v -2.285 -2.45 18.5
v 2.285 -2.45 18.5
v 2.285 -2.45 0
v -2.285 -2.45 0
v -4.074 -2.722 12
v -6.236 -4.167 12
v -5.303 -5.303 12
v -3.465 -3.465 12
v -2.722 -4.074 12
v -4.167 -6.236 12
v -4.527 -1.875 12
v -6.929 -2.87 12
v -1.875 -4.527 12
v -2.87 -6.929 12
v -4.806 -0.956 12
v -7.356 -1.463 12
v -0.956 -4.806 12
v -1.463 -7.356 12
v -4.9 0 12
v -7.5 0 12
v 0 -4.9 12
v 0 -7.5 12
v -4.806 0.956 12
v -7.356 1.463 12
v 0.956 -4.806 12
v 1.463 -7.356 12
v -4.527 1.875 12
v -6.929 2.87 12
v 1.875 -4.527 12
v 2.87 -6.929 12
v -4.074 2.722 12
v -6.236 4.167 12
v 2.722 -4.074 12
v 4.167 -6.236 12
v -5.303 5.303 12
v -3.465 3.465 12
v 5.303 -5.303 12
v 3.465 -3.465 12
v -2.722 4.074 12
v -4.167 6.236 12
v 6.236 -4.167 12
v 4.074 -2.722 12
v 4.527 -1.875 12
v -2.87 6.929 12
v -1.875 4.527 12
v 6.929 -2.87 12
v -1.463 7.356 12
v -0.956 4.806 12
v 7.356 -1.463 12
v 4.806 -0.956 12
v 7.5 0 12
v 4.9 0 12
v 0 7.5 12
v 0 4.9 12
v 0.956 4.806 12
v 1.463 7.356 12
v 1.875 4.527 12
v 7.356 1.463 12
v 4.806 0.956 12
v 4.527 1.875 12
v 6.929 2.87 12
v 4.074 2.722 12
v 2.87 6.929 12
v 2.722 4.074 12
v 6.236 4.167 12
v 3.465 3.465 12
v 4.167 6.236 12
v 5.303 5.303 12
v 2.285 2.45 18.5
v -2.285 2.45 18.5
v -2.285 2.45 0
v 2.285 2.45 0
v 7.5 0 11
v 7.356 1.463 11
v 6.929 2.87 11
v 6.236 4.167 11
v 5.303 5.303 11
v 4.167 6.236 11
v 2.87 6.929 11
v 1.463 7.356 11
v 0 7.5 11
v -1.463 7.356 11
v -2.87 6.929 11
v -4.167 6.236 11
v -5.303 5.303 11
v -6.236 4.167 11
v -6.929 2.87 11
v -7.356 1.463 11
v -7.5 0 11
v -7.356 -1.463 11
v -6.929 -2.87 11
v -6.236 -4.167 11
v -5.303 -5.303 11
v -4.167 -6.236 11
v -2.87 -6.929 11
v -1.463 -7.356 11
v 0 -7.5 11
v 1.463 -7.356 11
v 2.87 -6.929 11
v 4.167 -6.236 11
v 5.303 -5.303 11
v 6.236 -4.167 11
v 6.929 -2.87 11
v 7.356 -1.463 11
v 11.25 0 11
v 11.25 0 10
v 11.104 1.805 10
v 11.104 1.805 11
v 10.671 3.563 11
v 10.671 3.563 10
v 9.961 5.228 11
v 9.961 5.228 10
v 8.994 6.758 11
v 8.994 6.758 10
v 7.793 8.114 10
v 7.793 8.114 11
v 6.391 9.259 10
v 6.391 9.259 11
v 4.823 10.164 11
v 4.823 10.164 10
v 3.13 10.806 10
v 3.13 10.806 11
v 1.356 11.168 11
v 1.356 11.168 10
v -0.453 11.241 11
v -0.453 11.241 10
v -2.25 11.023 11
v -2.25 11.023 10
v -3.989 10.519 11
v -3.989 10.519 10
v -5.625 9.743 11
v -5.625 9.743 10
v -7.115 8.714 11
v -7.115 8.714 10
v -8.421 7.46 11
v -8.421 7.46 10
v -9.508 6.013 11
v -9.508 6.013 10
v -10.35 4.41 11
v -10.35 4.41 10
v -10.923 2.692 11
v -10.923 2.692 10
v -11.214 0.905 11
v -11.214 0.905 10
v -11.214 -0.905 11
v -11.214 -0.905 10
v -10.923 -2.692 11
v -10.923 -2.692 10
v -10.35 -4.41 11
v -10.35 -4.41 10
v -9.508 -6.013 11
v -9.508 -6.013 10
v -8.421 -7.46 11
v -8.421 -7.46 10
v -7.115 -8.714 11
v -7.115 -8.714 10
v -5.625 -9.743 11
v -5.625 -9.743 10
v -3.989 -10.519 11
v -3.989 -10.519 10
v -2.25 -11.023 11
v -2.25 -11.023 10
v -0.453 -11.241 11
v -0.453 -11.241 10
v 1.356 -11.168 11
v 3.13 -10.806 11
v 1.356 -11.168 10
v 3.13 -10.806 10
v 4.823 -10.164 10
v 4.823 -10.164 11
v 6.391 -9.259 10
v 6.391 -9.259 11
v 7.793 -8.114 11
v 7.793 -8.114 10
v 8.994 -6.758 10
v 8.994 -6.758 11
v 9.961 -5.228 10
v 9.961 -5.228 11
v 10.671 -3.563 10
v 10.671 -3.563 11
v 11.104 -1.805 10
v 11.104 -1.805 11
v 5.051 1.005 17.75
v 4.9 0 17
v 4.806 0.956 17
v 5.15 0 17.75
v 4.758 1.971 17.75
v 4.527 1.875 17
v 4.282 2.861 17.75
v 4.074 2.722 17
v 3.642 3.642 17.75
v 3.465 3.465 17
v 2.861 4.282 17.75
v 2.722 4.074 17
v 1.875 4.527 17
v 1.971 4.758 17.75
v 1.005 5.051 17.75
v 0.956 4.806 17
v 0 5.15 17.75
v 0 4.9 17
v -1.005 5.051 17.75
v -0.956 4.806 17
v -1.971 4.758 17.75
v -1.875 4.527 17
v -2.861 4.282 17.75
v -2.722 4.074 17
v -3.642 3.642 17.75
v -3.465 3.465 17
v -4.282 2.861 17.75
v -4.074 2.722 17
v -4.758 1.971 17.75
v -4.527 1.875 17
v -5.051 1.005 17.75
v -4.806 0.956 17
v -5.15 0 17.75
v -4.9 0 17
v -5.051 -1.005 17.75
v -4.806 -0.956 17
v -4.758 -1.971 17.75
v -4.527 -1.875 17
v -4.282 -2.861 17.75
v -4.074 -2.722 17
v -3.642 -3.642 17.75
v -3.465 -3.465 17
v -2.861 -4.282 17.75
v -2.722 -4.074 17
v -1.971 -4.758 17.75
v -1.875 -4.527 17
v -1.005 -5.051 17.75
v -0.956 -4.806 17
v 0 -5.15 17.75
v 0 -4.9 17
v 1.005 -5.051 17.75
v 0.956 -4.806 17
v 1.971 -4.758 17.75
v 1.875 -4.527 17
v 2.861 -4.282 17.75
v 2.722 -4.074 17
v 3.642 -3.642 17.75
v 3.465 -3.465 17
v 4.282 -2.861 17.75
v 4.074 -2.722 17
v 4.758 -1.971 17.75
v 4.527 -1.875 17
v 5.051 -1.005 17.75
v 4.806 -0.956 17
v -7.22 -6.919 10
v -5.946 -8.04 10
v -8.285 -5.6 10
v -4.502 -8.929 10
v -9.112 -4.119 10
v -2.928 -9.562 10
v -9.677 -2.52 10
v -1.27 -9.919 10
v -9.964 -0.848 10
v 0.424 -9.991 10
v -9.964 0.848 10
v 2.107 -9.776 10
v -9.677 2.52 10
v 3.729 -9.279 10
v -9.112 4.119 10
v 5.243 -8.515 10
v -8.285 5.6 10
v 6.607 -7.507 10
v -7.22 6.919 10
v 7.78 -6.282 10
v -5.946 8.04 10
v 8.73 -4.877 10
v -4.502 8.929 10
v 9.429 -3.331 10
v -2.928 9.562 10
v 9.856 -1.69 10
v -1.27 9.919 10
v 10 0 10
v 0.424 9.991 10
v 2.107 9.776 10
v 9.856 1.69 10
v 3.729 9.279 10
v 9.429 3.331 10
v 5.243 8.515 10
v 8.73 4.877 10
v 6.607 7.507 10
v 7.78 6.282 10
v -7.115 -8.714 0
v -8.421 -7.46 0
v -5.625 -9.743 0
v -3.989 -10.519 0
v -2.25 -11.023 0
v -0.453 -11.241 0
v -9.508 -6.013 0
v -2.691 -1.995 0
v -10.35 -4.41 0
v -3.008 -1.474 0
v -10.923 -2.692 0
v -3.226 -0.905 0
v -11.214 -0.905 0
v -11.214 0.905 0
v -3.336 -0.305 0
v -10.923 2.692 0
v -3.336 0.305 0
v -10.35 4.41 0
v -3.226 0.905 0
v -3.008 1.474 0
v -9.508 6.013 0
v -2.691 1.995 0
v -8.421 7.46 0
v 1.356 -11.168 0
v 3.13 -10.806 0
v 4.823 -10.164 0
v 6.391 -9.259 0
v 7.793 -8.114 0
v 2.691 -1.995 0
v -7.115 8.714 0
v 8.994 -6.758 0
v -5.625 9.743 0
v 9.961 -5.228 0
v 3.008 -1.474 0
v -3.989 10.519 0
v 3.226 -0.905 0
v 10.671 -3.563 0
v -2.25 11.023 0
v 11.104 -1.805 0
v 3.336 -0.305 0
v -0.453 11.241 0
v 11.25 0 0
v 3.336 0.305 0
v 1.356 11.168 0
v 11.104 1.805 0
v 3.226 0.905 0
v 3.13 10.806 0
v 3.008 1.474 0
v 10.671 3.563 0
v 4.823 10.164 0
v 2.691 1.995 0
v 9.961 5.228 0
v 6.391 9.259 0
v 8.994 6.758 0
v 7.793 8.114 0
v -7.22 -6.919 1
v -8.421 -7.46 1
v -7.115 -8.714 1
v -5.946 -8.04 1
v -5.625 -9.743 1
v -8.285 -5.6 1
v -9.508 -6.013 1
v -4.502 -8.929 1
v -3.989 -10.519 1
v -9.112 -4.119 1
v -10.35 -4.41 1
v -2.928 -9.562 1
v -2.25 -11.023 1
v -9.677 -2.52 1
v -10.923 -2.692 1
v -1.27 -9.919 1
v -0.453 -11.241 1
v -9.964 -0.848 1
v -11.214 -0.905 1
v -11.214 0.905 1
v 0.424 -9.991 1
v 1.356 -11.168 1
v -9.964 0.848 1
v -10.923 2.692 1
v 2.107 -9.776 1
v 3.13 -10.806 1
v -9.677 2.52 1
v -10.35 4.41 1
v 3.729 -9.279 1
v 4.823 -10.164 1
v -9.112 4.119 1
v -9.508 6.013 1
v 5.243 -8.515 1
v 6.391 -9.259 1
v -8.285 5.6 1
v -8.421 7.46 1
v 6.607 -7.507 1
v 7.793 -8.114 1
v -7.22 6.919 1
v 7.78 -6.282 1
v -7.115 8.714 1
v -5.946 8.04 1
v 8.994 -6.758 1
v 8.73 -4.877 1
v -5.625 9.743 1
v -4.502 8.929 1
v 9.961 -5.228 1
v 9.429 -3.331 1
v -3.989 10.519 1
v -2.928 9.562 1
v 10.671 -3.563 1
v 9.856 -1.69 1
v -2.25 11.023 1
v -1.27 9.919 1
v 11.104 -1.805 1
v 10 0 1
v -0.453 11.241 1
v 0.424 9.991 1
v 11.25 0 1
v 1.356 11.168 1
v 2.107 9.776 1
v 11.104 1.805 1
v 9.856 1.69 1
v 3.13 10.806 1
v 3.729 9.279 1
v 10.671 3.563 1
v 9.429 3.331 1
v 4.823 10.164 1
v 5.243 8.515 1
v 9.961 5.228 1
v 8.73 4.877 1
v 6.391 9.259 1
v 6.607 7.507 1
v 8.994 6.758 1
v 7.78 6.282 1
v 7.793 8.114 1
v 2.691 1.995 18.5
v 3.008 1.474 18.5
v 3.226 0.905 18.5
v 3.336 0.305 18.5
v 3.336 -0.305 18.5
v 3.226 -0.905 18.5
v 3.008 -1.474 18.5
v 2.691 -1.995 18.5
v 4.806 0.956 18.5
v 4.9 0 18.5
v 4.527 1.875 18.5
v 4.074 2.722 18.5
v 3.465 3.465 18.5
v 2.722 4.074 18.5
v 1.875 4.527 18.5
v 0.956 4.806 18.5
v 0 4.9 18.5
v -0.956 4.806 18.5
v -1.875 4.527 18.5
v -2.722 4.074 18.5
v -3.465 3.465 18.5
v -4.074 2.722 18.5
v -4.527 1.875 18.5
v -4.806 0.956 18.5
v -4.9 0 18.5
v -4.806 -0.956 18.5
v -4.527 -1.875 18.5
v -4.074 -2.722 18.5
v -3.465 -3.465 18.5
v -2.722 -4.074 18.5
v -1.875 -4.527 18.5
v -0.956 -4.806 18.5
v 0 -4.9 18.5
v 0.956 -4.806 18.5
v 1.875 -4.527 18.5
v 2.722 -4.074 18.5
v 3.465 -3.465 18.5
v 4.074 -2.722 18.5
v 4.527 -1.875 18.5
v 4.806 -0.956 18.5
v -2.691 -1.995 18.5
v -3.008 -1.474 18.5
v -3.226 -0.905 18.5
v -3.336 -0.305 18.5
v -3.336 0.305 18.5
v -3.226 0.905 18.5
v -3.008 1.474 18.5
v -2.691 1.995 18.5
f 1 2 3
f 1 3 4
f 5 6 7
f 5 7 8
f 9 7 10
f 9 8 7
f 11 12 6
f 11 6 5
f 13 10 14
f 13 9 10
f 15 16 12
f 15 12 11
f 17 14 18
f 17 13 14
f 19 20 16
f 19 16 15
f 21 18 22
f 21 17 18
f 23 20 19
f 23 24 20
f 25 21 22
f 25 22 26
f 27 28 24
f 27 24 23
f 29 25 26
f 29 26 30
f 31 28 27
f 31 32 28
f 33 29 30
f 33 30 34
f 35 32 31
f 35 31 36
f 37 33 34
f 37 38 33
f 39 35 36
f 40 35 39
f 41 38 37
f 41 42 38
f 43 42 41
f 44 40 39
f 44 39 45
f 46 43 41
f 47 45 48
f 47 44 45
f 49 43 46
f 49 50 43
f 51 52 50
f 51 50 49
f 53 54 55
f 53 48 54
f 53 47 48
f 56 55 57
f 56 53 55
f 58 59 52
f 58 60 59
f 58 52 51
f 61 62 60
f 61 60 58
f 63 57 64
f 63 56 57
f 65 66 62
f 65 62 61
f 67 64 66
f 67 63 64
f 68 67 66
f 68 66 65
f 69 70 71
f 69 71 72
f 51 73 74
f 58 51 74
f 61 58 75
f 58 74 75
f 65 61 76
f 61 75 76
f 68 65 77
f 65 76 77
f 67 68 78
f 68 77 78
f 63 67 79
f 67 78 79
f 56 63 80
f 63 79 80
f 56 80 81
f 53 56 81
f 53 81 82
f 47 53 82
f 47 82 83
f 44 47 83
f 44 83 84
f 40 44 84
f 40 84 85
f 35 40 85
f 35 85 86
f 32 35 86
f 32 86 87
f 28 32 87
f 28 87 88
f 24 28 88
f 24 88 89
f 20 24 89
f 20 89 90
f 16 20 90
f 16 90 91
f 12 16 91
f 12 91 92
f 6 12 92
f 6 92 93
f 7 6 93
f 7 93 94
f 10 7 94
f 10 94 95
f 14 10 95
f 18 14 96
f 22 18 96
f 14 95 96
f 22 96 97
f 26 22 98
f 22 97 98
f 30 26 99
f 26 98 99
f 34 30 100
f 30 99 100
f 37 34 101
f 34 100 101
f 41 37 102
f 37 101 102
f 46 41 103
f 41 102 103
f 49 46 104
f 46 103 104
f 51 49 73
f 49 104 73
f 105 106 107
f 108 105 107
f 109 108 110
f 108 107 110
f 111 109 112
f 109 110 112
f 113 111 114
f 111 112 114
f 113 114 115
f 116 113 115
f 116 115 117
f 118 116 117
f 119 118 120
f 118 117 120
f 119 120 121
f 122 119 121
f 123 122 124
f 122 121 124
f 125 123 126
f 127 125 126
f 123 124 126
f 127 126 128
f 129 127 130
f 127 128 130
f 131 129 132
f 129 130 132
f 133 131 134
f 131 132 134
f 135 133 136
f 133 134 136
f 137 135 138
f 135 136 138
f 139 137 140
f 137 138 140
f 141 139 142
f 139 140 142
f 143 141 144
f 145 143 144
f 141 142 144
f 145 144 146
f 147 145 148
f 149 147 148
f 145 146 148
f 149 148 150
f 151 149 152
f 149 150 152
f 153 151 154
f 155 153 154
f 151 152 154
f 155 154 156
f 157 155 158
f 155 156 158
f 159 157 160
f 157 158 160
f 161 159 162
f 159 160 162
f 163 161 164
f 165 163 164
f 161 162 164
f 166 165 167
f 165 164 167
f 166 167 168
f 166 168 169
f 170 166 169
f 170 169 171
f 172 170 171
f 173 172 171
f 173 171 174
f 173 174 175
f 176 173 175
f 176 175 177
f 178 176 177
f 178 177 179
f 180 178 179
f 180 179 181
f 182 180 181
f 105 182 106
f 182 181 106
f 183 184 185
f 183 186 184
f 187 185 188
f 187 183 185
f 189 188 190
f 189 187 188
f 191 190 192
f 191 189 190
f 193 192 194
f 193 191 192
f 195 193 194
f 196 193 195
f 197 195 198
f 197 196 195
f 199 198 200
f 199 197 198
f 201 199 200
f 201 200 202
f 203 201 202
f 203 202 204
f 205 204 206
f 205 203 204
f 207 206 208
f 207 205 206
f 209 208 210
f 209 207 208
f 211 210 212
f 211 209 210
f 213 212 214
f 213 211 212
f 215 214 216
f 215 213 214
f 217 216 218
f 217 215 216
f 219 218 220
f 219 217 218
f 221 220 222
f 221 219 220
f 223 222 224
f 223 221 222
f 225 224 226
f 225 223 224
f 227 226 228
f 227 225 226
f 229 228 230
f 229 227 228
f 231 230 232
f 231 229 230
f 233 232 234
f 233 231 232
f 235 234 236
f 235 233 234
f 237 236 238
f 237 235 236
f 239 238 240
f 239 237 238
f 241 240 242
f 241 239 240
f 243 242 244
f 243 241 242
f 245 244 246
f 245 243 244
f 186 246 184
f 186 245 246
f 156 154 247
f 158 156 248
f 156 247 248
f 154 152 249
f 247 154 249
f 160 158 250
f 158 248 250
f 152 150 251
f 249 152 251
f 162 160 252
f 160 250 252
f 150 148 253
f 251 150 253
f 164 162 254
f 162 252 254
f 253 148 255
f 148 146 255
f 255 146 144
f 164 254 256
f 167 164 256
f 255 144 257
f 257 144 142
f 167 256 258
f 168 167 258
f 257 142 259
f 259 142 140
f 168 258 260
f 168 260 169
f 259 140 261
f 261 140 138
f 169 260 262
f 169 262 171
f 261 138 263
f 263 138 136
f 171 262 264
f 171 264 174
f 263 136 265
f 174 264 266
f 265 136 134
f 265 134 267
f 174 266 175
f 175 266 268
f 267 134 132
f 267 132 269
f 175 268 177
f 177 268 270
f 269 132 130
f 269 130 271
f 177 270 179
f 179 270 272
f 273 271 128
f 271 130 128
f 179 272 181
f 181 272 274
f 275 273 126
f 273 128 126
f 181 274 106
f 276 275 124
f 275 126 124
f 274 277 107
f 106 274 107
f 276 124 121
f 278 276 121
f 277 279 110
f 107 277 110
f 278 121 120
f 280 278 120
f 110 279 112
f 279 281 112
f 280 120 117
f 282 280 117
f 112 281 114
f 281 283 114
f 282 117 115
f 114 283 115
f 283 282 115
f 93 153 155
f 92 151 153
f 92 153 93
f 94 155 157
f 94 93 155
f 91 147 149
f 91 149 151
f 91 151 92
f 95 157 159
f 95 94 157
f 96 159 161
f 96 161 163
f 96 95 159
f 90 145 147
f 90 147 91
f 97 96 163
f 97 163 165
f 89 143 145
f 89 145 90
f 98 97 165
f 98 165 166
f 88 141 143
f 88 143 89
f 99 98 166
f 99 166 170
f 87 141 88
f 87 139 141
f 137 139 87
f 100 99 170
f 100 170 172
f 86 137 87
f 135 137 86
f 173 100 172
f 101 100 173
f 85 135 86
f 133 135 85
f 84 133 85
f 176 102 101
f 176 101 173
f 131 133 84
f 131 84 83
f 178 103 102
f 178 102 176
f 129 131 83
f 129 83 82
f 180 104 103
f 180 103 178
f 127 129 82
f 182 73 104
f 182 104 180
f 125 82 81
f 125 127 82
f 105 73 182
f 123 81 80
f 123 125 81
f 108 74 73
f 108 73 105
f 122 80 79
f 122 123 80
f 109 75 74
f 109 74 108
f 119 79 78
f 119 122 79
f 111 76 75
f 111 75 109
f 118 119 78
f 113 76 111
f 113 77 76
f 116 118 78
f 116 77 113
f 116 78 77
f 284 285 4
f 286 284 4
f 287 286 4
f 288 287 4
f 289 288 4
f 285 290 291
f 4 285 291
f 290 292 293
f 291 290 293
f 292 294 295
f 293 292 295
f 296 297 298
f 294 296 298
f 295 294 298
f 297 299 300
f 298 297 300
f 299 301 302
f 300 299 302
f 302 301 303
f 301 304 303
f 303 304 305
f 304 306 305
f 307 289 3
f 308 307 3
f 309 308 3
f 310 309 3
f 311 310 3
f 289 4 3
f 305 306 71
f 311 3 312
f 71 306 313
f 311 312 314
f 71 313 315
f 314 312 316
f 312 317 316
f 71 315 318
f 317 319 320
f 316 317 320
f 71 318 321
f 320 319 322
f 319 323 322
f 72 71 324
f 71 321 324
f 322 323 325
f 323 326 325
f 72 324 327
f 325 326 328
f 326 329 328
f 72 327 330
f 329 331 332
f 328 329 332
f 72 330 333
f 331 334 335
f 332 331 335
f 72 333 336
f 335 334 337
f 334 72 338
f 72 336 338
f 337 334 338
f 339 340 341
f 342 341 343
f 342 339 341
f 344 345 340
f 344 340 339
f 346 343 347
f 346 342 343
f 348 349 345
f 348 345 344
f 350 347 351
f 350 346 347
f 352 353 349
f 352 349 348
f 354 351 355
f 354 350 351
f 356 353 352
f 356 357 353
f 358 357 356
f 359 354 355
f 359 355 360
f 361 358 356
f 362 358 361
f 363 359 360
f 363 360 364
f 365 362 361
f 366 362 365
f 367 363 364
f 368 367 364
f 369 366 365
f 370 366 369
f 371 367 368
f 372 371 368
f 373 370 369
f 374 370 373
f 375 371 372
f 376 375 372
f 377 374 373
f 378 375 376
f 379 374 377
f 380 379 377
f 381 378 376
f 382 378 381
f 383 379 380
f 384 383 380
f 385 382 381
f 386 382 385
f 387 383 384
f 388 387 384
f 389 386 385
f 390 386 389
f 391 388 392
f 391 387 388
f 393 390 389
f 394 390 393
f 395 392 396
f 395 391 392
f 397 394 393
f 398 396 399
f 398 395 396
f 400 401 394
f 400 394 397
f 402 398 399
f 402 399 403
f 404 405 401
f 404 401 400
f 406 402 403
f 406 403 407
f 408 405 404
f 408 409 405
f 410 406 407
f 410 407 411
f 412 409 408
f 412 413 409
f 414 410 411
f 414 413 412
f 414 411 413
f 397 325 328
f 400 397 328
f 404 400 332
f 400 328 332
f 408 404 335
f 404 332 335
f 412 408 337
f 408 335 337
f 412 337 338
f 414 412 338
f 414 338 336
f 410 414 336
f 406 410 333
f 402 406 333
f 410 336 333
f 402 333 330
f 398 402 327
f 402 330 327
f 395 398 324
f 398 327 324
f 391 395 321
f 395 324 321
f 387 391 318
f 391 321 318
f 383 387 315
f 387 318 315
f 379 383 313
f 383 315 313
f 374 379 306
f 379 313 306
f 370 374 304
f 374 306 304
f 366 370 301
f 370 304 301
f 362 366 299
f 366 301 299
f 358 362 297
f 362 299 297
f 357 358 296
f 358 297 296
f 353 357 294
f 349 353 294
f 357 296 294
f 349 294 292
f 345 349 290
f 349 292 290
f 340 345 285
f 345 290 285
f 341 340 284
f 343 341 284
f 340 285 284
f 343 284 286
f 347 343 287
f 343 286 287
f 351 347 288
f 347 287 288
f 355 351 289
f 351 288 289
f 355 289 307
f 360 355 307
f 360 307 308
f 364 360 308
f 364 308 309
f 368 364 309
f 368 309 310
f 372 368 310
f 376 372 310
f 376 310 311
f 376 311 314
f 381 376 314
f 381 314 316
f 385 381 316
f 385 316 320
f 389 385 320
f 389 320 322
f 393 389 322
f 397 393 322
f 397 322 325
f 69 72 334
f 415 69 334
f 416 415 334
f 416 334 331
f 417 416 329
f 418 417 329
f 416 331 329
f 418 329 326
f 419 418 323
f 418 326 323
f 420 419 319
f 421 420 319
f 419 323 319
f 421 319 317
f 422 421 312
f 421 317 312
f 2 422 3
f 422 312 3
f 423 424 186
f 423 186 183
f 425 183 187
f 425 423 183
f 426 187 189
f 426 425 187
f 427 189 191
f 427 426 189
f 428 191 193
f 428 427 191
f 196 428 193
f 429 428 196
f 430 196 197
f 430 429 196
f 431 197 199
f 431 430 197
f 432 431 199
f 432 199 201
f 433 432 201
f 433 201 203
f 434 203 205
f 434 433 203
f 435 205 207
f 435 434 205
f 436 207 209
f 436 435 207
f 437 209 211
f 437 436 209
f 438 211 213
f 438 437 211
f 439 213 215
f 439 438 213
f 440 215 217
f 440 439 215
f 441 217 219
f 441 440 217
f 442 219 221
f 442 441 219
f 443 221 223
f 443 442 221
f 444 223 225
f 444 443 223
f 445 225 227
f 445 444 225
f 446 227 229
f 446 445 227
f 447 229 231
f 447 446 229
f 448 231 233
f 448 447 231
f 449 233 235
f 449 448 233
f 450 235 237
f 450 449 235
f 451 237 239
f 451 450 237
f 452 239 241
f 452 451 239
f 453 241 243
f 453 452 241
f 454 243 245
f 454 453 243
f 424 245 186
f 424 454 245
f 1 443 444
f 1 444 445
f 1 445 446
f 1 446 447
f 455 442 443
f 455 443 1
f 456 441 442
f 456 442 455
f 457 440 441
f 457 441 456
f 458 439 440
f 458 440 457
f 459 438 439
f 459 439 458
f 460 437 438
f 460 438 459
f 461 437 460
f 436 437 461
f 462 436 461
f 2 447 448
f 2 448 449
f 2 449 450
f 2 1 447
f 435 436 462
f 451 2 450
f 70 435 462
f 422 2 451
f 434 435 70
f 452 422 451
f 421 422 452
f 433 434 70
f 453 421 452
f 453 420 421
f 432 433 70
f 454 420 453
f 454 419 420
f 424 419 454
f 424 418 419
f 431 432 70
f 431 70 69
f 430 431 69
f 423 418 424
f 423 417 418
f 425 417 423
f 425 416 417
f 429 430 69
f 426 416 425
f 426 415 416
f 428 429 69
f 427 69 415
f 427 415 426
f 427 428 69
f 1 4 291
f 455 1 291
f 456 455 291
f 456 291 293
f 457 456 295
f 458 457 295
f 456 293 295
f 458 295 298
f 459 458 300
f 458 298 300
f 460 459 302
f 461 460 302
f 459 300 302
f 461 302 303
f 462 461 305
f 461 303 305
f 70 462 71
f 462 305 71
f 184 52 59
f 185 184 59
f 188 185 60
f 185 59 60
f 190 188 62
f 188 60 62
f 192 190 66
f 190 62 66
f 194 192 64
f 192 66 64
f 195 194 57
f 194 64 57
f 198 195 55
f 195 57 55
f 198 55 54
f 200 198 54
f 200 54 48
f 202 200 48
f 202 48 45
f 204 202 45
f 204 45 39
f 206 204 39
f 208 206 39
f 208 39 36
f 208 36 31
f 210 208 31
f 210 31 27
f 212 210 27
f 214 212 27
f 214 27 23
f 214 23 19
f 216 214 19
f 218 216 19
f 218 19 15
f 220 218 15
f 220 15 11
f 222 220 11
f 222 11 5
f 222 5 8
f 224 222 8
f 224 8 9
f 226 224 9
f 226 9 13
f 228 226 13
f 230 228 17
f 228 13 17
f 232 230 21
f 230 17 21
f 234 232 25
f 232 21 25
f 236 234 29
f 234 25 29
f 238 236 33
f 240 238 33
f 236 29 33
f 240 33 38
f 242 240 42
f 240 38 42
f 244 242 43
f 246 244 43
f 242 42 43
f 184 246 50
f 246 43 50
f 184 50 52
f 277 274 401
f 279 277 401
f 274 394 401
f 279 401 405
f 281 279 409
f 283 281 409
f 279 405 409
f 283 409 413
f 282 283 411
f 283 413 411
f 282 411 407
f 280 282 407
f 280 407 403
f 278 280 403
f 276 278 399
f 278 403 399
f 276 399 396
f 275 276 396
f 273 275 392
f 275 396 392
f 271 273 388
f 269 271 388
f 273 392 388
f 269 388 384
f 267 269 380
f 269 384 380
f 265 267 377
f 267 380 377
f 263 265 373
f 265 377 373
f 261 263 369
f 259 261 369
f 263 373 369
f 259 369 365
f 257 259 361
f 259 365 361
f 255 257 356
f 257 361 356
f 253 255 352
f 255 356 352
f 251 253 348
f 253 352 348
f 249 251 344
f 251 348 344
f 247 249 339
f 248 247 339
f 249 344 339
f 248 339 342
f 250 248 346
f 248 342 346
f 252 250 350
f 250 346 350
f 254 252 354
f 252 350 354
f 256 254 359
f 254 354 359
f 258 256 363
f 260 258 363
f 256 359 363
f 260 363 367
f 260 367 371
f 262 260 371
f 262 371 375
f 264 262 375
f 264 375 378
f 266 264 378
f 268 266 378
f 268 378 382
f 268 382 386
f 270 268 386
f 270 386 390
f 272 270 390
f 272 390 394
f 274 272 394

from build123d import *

# Parameters (mm, degrees)
F2_R         = 10
F2_R_2       = 7.5
F2_R_3       = 4.9
F3_DEPTH     = 11
F4_DEPTH     = 9
F5_DEPTH     = 18.5
F2_R_4       = 11.25
F10_DEPTH    = 1
F11_START    = 9
F10_FACE_R   = 11.25
F10_FACE_R_2 = 10
F11_DEPTH    = 1
F12_DEPTH    = 12


with BuildPart() as f3:
    # F2 (on Top) → F3 (new body)
    with BuildSketch(Plane.XY):
        Circle(F2_R)
        Circle(F2_R_2, mode=Mode.SUBTRACT)
        Circle(F2_R_2)
        Circle(F2_R_3, mode=Mode.SUBTRACT)
        Circle(F2_R_3)
        with BuildLine():
            ThreePointArc((-2.2847319318, -2.45), (-3.35, 0), (-2.2847319318, 2.45))
            Line((-2.2847319318, 2.45), (2.2847319318, 2.45))
            ThreePointArc((2.2847319318, 2.45), (3.35, 0), (2.2847319318, -2.45))
            Line((2.2847319318, -2.45), (-2.2847319318, -2.45))
        make_face(mode=Mode.SUBTRACT)
    extrude(amount=F3_DEPTH)

    # F2 (on Top) → F4 (join)
    with BuildSketch(Plane.XY):
        Circle(F2_R_2)
        Circle(F2_R_3, mode=Mode.SUBTRACT)
        Circle(F2_R_3)
        with BuildLine():
            ThreePointArc((-2.2847319318, -2.45), (-3.35, 0), (-2.2847319318, 2.45))
            Line((-2.2847319318, 2.45), (2.2847319318, 2.45))
            ThreePointArc((2.2847319318, 2.45), (3.35, 0), (2.2847319318, -2.45))
            Line((2.2847319318, -2.45), (-2.2847319318, -2.45))
        make_face(mode=Mode.SUBTRACT)
    extrude(amount=F4_DEPTH)

    # F2 (on Top) → F5 (join)
    with BuildSketch(Plane.XY):
        Circle(F2_R_3)
        with BuildLine():
            ThreePointArc((-2.2847319318, -2.45), (-3.35, 0), (-2.2847319318, 2.45))
            Line((-2.2847319318, 2.45), (2.2847319318, 2.45))
            ThreePointArc((2.2847319318, 2.45), (3.35, 0), (2.2847319318, -2.45))
            Line((2.2847319318, -2.45), (-2.2847319318, -2.45))
        make_face(mode=Mode.SUBTRACT)
    extrude(amount=F5_DEPTH)

    # F6 (on Front) → F7 (revolve)
    with BuildSketch(Plane.XZ):
        Polygon((5.15, 17.75), (4.9, 18.5), (4.9, 17), align=None)
    revolve(axis=Axis((0, 0, 8.7542282417), (0, 0, 1)))

    # F2 (on Top) → F10 (join)
    with BuildSketch(Plane.XY):
        Circle(F2_R_4)
        Circle(F2_R, mode=Mode.SUBTRACT)
    extrude(amount=F10_DEPTH)

    # F2 (on Top) + F10_face (on face) → F11 (join)
    with BuildSketch(Plane.XY.offset(F11_START)):
        Circle(F2_R)
        Circle(F2_R_2, mode=Mode.SUBTRACT)
    with BuildSketch(Plane.XY.offset(1).offset(F11_START)):
        Circle(F10_FACE_R)
        Circle(F10_FACE_R_2, mode=Mode.SUBTRACT)
    extrude(amount=F11_DEPTH)

    # F2 (on Top) → F12 (join)
    with BuildSketch(Plane.XY):
        Circle(F2_R_2)
        Circle(F2_R_3, mode=Mode.SUBTRACT)
    extrude(amount=F12_DEPTH)


solid = f3.part
